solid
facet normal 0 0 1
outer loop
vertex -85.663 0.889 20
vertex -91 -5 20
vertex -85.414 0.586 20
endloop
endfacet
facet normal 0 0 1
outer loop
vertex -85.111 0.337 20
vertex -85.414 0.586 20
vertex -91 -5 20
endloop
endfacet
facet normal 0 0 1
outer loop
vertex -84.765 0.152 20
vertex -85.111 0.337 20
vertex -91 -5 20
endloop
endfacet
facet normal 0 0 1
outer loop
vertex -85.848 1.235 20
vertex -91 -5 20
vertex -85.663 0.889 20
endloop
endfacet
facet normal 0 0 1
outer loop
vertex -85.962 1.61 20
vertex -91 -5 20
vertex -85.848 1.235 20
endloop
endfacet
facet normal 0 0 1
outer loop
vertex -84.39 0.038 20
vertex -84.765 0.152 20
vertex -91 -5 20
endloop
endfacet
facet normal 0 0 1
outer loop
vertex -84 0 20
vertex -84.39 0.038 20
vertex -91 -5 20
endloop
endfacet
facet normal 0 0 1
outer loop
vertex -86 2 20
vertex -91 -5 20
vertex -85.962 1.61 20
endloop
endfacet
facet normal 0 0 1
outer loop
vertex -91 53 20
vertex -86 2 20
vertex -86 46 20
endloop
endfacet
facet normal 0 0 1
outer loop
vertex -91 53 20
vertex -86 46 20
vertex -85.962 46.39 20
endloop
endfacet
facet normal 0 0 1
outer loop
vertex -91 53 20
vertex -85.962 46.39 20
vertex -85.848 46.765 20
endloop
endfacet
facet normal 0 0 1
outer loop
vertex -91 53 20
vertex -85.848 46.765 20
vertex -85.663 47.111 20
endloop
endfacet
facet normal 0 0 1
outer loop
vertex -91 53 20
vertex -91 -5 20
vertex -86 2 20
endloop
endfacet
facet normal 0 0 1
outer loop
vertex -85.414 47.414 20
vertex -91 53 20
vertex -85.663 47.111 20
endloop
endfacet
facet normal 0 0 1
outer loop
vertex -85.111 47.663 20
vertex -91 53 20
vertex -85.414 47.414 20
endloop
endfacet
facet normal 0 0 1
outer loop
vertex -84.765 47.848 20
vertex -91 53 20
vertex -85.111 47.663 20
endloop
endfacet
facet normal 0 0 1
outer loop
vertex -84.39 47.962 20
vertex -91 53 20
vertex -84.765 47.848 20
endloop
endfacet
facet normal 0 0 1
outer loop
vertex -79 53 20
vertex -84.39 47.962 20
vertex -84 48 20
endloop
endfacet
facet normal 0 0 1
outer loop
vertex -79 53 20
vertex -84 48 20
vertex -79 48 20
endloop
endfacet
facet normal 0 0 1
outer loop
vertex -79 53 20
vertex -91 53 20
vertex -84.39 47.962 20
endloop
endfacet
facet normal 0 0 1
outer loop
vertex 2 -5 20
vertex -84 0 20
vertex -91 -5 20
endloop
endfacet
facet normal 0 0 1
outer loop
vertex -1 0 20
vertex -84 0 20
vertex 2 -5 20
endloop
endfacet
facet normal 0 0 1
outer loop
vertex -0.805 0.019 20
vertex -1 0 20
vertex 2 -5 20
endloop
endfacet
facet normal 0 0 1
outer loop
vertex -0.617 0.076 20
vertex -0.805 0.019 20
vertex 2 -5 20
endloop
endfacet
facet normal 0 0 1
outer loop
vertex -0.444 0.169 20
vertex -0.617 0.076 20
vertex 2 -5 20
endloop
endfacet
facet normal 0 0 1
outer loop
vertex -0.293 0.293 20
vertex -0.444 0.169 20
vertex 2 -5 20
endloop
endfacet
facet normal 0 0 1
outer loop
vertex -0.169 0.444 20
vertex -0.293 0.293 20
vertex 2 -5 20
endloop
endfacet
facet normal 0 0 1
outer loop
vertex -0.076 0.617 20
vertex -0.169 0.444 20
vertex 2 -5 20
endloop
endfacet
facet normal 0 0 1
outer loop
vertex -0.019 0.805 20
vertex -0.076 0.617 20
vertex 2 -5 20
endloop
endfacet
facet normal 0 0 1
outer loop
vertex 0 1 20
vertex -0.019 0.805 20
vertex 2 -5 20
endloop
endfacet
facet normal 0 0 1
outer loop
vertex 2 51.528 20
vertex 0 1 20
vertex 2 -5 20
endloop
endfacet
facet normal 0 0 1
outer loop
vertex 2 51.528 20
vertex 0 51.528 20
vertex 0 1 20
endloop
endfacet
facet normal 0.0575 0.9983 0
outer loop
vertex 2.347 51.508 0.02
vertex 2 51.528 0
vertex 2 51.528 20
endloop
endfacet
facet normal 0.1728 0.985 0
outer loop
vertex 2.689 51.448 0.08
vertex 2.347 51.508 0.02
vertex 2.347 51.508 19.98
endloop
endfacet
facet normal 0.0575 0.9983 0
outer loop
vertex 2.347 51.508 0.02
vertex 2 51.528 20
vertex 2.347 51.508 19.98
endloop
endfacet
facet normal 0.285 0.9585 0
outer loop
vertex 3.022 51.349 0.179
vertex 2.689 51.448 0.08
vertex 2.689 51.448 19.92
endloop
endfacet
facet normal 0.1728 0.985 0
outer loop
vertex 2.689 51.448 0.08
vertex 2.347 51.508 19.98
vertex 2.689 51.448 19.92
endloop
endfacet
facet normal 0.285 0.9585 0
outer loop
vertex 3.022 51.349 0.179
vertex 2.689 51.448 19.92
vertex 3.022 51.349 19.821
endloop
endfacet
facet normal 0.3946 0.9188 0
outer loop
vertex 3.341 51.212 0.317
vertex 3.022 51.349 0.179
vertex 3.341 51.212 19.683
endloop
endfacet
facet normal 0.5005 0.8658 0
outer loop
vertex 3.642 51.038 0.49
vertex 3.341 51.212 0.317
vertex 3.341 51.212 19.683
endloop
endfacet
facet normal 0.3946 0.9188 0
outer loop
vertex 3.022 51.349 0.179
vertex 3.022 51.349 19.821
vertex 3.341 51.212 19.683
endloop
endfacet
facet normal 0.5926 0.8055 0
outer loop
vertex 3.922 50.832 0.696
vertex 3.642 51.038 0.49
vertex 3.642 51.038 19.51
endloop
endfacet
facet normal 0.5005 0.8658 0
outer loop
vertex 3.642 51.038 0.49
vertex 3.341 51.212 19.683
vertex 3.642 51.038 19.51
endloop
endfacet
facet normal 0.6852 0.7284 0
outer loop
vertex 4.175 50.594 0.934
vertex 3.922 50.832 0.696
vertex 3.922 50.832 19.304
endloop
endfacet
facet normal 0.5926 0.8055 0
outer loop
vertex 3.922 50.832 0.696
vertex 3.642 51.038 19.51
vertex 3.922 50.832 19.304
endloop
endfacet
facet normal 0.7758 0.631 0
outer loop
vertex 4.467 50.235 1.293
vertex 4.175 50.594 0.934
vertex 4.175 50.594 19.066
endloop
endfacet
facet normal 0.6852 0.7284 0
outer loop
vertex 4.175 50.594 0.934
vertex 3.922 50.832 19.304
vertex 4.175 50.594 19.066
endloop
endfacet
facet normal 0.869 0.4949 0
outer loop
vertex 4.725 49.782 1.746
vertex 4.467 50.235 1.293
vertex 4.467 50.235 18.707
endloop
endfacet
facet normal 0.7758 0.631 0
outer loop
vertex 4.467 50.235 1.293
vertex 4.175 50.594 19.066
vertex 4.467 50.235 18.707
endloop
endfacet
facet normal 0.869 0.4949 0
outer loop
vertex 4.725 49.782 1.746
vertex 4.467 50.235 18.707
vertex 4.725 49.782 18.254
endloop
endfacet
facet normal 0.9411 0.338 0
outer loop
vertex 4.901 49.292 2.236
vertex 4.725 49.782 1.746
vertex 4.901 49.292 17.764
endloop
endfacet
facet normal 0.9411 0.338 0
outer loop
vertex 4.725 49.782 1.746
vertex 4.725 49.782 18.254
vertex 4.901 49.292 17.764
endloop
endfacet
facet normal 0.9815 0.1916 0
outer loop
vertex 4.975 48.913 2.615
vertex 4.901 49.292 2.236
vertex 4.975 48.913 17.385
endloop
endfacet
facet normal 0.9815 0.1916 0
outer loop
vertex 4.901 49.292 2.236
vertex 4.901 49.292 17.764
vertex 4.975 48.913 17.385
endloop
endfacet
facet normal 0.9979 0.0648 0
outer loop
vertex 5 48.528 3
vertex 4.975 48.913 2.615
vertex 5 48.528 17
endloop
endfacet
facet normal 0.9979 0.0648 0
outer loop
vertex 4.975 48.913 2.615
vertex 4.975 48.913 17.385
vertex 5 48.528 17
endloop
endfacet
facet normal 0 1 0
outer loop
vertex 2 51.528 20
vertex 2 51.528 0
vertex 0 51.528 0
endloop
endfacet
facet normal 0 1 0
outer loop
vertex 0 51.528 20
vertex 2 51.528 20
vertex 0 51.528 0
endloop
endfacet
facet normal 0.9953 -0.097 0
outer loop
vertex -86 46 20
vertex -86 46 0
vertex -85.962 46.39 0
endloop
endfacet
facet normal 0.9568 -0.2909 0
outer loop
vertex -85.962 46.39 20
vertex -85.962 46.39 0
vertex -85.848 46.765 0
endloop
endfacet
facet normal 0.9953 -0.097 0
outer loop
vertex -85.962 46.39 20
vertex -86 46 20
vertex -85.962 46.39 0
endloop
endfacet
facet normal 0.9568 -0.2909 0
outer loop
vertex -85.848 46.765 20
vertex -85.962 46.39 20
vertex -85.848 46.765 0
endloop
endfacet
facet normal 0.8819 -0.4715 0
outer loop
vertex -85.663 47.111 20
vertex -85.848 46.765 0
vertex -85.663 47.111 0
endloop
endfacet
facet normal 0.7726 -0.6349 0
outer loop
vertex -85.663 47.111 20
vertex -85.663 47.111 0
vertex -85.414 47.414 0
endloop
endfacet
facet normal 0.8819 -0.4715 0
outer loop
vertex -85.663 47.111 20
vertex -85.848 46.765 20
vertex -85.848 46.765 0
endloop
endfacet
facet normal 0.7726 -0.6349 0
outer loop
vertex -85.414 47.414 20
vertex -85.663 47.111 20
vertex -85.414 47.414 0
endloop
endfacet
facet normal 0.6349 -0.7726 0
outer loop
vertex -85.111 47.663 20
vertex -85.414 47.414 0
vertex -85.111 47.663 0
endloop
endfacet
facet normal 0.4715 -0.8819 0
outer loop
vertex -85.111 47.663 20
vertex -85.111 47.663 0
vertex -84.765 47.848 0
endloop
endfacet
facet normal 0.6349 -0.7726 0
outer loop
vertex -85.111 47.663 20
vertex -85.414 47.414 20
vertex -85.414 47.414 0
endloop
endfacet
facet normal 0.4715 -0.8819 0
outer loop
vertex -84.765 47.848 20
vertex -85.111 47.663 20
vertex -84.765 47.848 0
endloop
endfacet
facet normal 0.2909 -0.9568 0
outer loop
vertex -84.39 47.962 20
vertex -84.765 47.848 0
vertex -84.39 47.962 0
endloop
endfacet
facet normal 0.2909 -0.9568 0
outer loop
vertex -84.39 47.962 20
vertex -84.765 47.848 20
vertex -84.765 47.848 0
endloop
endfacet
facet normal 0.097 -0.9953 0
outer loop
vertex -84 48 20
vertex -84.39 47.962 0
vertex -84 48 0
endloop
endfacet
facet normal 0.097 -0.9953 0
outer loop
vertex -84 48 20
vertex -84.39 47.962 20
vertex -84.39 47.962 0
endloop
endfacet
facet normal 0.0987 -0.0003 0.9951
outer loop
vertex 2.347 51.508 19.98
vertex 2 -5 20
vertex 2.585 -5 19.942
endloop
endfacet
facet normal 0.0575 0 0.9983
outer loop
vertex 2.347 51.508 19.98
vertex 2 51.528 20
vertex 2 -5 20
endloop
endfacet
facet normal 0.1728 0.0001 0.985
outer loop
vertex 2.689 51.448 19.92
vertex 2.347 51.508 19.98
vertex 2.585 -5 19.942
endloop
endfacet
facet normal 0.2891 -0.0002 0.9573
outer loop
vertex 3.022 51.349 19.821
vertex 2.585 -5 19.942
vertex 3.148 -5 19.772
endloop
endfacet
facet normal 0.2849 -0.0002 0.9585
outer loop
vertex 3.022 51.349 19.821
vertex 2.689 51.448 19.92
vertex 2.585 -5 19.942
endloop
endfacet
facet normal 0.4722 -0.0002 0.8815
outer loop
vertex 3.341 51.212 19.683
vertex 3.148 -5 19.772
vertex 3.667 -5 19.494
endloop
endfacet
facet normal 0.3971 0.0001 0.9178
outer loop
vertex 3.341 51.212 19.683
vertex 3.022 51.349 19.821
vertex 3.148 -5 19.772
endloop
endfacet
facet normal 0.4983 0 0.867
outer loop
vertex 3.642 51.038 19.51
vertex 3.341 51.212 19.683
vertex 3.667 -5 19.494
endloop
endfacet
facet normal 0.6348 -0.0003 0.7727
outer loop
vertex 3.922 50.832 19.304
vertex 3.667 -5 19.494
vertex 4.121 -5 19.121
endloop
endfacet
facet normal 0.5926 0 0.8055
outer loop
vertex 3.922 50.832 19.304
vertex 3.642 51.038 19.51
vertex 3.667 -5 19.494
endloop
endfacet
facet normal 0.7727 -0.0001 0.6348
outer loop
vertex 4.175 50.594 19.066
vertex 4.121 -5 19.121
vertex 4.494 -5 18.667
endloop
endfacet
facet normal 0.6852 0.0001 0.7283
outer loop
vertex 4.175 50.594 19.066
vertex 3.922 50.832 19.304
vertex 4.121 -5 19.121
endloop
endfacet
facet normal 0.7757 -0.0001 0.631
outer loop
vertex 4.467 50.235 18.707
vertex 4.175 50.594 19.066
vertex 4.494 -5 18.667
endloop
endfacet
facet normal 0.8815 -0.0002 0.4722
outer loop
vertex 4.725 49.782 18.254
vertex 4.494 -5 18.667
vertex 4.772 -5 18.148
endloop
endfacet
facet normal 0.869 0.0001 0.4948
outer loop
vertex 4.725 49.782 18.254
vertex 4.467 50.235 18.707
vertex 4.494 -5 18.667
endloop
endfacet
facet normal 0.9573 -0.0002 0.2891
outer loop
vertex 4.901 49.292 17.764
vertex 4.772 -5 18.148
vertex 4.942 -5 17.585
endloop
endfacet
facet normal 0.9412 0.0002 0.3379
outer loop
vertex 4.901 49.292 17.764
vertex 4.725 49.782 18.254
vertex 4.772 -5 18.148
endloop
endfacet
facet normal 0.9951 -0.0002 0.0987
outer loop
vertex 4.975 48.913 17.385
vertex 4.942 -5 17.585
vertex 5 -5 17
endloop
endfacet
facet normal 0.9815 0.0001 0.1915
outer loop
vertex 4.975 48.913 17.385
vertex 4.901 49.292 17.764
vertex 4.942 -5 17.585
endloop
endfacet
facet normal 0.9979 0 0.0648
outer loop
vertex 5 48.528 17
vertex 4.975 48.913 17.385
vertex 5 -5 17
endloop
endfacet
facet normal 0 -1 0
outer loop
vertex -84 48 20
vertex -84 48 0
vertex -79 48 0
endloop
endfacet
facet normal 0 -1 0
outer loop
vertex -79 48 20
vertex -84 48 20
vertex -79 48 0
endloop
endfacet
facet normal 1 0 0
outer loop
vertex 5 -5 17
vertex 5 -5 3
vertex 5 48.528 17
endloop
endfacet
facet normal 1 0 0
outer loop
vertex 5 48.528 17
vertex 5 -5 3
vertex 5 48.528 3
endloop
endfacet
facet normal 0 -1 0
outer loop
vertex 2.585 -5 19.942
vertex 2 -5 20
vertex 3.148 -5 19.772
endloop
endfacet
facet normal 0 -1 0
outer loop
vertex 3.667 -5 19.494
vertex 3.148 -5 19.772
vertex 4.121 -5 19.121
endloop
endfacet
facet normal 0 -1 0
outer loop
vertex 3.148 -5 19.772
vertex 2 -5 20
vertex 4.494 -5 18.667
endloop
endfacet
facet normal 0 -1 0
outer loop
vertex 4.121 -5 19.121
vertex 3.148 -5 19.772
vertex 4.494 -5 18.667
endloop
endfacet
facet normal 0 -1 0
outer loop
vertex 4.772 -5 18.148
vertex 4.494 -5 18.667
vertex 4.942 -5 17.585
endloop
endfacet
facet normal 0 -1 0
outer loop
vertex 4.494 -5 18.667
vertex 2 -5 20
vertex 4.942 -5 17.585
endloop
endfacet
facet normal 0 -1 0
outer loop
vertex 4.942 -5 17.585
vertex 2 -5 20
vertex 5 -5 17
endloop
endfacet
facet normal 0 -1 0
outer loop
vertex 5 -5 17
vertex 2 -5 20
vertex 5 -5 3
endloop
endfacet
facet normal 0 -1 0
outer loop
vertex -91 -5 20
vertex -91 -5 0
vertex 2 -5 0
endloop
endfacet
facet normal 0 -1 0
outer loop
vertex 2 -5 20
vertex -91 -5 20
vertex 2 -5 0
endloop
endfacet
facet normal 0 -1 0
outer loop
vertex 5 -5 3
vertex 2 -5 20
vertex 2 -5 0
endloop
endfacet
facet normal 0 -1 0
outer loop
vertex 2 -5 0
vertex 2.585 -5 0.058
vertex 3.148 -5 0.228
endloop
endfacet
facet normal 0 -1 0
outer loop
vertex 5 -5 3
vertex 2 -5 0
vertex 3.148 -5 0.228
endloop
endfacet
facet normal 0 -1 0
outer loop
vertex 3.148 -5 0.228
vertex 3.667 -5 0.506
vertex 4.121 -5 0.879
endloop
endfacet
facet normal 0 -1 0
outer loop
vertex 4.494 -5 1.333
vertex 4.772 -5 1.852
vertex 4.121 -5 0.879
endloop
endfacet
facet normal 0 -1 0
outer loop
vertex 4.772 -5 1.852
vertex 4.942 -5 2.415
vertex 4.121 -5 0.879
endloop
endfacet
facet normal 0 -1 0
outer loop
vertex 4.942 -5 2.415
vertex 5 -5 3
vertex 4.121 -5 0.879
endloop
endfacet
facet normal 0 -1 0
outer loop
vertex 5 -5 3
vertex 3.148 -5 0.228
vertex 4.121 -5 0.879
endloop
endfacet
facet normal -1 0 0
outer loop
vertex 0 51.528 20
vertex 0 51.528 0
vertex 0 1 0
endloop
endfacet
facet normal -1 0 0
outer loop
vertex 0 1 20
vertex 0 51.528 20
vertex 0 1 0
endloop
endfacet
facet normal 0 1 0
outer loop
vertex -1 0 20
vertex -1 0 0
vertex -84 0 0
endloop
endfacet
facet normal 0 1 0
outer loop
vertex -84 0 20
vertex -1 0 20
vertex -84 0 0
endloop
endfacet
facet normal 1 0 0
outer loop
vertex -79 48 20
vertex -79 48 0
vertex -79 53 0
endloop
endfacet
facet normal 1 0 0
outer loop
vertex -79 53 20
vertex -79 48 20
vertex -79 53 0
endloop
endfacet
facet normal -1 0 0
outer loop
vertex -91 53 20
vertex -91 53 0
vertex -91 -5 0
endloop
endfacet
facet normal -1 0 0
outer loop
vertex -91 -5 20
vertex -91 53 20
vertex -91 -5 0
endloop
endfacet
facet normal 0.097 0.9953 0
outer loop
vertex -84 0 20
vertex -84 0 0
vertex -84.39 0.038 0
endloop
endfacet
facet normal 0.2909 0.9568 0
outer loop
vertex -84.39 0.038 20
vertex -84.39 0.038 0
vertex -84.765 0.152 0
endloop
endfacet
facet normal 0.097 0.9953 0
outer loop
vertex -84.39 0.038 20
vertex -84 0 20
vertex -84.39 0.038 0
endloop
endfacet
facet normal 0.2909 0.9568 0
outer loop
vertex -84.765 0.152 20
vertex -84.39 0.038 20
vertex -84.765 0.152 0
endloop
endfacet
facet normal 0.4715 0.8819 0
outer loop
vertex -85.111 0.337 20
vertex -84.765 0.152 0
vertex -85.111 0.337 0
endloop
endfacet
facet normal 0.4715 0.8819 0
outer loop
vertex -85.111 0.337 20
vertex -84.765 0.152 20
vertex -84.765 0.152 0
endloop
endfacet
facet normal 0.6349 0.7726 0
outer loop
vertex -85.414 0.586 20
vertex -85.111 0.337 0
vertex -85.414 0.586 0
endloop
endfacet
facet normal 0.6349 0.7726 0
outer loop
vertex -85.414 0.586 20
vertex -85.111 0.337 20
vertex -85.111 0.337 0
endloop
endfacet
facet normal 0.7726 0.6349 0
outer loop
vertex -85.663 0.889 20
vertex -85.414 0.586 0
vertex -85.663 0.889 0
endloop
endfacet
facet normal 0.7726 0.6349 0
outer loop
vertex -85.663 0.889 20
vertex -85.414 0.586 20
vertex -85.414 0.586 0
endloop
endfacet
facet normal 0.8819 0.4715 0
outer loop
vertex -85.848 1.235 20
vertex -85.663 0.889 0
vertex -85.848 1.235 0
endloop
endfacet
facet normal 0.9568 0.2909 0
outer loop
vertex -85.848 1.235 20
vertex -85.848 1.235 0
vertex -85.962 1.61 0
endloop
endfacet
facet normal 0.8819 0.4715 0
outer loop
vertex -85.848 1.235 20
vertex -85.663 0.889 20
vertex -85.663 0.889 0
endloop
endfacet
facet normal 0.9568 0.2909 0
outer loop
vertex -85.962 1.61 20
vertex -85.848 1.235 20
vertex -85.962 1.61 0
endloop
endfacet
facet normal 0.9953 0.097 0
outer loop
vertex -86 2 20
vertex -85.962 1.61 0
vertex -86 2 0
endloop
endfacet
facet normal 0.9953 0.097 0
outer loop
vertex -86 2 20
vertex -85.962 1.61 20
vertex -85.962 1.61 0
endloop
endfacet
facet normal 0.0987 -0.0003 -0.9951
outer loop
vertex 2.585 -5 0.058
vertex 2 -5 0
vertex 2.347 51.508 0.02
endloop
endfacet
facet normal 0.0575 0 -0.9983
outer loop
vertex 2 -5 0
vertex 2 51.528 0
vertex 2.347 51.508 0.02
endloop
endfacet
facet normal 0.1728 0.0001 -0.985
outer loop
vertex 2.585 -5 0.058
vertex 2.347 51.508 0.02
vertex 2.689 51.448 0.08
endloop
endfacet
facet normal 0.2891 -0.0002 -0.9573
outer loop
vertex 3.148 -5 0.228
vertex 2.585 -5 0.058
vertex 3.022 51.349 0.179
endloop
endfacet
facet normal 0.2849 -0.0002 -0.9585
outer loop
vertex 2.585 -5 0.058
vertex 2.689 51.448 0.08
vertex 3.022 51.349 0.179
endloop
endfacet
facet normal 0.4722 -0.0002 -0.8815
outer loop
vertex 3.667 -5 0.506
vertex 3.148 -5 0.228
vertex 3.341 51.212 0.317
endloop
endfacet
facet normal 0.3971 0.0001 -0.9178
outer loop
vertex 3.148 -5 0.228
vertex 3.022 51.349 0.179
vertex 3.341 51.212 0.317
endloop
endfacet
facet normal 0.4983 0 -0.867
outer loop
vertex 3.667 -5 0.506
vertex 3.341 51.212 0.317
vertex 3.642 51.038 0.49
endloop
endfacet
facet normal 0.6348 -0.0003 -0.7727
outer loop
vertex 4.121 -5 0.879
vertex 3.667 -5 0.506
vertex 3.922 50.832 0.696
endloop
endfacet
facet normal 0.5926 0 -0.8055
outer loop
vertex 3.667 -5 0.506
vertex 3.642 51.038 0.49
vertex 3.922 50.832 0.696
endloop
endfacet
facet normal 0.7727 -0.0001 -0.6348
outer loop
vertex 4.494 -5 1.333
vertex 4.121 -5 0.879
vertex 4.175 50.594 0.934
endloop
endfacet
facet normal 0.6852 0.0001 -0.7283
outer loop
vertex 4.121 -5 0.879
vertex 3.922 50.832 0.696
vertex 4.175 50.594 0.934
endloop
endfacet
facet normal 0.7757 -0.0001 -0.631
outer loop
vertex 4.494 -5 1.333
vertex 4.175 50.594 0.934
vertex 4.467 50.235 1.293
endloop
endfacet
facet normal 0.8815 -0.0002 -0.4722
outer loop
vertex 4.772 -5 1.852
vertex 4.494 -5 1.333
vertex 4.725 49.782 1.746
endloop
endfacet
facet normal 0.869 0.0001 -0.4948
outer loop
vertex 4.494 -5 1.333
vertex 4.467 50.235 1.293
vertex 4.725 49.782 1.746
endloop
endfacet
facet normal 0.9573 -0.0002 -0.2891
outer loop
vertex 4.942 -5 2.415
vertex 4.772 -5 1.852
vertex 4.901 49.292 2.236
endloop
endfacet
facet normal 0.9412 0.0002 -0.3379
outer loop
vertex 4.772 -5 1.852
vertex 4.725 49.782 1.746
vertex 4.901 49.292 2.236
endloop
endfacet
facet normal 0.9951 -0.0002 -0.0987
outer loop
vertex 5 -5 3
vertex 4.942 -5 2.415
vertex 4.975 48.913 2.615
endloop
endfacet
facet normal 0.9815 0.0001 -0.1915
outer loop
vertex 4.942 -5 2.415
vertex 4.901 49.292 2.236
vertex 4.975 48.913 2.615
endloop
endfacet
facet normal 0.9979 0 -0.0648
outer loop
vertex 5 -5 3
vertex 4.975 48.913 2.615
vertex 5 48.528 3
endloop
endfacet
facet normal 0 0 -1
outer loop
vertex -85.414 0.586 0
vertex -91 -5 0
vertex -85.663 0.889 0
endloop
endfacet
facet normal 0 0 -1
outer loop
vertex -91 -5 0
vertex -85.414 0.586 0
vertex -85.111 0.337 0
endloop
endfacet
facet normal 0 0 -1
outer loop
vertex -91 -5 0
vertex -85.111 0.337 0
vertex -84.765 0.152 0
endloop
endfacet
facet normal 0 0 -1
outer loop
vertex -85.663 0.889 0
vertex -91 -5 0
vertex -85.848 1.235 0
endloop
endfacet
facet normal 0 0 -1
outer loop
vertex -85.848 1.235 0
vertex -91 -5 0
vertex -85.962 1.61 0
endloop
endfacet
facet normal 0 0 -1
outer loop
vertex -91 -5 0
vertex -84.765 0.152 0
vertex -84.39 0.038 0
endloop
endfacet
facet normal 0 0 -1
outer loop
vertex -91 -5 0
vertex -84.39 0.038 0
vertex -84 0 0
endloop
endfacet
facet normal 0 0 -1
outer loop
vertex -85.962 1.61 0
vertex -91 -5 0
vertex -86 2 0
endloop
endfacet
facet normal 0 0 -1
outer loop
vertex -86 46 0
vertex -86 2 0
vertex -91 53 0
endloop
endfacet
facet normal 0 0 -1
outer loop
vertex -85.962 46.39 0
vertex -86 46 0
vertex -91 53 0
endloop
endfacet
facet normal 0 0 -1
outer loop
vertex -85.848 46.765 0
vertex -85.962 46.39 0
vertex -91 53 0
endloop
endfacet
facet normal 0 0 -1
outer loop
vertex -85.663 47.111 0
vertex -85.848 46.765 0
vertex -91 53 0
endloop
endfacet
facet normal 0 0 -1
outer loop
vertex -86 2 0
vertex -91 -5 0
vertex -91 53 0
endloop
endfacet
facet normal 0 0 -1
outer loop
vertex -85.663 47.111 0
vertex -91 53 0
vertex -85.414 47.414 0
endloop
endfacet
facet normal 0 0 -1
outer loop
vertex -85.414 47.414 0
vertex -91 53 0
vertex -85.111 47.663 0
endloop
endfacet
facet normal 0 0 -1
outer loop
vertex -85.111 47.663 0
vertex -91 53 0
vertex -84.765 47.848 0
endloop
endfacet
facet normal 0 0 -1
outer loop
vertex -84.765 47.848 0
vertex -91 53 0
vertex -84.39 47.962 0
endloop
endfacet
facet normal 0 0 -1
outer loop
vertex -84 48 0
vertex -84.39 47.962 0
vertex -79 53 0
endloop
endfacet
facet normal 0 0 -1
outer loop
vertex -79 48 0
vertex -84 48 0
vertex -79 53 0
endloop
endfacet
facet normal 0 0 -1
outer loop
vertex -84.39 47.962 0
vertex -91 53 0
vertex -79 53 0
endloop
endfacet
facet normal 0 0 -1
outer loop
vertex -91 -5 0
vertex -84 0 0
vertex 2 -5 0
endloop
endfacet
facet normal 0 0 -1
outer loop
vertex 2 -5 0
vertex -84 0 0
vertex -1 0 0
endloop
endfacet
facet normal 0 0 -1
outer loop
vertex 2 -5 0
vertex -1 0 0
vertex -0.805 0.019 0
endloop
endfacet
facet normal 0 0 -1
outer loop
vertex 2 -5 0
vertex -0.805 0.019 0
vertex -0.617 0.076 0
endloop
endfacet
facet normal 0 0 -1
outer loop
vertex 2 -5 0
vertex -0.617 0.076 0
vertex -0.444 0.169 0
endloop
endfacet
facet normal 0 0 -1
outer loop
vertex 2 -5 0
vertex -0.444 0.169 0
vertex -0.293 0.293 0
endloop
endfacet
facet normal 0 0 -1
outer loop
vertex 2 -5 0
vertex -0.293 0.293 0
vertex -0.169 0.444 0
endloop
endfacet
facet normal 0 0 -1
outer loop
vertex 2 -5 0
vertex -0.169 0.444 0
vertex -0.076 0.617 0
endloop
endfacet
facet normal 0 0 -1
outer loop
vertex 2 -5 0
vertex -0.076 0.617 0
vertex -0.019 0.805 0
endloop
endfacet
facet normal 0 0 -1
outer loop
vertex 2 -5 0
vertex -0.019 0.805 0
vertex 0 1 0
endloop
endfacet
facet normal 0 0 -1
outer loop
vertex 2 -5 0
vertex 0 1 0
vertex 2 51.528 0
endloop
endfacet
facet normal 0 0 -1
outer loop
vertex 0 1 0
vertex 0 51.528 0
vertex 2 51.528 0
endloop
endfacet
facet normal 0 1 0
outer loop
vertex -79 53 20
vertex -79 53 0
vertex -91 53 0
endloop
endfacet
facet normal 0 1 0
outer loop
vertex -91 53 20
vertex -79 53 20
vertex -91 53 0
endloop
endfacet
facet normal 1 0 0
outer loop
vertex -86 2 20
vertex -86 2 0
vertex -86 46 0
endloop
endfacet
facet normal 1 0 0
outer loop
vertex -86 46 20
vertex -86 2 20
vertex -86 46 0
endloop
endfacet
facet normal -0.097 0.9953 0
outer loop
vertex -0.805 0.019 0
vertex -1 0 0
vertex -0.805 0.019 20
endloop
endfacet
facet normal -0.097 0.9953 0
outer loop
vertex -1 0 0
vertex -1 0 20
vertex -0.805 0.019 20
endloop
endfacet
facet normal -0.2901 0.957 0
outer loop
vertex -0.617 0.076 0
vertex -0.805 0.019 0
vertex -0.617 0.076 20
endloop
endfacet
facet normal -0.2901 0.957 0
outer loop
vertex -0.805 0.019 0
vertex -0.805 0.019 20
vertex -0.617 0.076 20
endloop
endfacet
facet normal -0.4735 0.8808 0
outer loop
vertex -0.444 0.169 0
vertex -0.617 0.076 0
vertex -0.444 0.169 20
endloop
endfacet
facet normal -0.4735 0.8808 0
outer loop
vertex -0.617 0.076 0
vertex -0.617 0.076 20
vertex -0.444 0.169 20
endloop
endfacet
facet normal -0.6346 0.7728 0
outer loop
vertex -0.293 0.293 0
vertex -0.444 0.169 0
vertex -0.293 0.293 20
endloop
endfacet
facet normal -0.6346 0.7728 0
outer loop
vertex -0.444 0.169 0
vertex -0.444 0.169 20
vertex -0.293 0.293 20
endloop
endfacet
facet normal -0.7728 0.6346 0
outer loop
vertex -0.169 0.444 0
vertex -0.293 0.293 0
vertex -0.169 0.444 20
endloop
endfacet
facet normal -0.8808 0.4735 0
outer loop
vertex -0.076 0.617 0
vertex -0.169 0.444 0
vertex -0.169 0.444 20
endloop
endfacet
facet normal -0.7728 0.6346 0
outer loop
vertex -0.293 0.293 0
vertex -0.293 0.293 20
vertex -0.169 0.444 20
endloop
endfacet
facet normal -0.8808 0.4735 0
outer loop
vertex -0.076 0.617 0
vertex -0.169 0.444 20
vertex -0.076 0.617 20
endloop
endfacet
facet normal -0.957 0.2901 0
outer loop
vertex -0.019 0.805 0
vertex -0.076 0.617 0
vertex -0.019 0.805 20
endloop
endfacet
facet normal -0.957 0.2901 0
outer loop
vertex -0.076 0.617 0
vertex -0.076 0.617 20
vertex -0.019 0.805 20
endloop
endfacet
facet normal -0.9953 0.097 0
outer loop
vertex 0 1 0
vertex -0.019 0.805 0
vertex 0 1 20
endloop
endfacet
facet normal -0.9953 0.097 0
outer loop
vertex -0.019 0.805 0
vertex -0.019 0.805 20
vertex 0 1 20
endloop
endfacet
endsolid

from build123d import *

# Parameters (mm, degrees)
F1_DEPTH = 20
F2_R     = 1
F3_R     = 2
F4_R     = 3


with BuildPart() as f1:
    # F0 (on Top) → F1 (new body)
    with BuildSketch(Plane.XY):
        Polygon((0, -4.999999), (0, 0), (-86, 0), (-86, 48), (-79, 48), (-79, 52.999999), (-90.999999, 52.999999), (-90.999999, -4.999999), align=None)
        Polygon((0, 51.528051), (0, 0), (0, -4.999999), (5, -4.999999), (5, 0), (5, 51.528051), align=None)
    extrude(amount=F1_DEPTH)

    # F2
    f2_edges = [f1.edges().sort_by_distance(p)[0] for p in [
        (0, 0, 10),
    ]]
    fillet(f2_edges, radius=F2_R)

    # F3
    f3_edges = [f1.edges().sort_by_distance(p)[0] for p in [
        (-86, 48, 10),
        (-86, 0, 10),
    ]]
    fillet(f3_edges, radius=F3_R)

    # F4
    f4_edges = [f1.edges().sort_by_distance(p)[0] for p in [
        (5, 23.264026, 0),
        (5, 51.528051, 10),
        (5, 23.264026, 20),
    ]]
    fillet(f4_edges, radius=F4_R)


solid = f1.part
